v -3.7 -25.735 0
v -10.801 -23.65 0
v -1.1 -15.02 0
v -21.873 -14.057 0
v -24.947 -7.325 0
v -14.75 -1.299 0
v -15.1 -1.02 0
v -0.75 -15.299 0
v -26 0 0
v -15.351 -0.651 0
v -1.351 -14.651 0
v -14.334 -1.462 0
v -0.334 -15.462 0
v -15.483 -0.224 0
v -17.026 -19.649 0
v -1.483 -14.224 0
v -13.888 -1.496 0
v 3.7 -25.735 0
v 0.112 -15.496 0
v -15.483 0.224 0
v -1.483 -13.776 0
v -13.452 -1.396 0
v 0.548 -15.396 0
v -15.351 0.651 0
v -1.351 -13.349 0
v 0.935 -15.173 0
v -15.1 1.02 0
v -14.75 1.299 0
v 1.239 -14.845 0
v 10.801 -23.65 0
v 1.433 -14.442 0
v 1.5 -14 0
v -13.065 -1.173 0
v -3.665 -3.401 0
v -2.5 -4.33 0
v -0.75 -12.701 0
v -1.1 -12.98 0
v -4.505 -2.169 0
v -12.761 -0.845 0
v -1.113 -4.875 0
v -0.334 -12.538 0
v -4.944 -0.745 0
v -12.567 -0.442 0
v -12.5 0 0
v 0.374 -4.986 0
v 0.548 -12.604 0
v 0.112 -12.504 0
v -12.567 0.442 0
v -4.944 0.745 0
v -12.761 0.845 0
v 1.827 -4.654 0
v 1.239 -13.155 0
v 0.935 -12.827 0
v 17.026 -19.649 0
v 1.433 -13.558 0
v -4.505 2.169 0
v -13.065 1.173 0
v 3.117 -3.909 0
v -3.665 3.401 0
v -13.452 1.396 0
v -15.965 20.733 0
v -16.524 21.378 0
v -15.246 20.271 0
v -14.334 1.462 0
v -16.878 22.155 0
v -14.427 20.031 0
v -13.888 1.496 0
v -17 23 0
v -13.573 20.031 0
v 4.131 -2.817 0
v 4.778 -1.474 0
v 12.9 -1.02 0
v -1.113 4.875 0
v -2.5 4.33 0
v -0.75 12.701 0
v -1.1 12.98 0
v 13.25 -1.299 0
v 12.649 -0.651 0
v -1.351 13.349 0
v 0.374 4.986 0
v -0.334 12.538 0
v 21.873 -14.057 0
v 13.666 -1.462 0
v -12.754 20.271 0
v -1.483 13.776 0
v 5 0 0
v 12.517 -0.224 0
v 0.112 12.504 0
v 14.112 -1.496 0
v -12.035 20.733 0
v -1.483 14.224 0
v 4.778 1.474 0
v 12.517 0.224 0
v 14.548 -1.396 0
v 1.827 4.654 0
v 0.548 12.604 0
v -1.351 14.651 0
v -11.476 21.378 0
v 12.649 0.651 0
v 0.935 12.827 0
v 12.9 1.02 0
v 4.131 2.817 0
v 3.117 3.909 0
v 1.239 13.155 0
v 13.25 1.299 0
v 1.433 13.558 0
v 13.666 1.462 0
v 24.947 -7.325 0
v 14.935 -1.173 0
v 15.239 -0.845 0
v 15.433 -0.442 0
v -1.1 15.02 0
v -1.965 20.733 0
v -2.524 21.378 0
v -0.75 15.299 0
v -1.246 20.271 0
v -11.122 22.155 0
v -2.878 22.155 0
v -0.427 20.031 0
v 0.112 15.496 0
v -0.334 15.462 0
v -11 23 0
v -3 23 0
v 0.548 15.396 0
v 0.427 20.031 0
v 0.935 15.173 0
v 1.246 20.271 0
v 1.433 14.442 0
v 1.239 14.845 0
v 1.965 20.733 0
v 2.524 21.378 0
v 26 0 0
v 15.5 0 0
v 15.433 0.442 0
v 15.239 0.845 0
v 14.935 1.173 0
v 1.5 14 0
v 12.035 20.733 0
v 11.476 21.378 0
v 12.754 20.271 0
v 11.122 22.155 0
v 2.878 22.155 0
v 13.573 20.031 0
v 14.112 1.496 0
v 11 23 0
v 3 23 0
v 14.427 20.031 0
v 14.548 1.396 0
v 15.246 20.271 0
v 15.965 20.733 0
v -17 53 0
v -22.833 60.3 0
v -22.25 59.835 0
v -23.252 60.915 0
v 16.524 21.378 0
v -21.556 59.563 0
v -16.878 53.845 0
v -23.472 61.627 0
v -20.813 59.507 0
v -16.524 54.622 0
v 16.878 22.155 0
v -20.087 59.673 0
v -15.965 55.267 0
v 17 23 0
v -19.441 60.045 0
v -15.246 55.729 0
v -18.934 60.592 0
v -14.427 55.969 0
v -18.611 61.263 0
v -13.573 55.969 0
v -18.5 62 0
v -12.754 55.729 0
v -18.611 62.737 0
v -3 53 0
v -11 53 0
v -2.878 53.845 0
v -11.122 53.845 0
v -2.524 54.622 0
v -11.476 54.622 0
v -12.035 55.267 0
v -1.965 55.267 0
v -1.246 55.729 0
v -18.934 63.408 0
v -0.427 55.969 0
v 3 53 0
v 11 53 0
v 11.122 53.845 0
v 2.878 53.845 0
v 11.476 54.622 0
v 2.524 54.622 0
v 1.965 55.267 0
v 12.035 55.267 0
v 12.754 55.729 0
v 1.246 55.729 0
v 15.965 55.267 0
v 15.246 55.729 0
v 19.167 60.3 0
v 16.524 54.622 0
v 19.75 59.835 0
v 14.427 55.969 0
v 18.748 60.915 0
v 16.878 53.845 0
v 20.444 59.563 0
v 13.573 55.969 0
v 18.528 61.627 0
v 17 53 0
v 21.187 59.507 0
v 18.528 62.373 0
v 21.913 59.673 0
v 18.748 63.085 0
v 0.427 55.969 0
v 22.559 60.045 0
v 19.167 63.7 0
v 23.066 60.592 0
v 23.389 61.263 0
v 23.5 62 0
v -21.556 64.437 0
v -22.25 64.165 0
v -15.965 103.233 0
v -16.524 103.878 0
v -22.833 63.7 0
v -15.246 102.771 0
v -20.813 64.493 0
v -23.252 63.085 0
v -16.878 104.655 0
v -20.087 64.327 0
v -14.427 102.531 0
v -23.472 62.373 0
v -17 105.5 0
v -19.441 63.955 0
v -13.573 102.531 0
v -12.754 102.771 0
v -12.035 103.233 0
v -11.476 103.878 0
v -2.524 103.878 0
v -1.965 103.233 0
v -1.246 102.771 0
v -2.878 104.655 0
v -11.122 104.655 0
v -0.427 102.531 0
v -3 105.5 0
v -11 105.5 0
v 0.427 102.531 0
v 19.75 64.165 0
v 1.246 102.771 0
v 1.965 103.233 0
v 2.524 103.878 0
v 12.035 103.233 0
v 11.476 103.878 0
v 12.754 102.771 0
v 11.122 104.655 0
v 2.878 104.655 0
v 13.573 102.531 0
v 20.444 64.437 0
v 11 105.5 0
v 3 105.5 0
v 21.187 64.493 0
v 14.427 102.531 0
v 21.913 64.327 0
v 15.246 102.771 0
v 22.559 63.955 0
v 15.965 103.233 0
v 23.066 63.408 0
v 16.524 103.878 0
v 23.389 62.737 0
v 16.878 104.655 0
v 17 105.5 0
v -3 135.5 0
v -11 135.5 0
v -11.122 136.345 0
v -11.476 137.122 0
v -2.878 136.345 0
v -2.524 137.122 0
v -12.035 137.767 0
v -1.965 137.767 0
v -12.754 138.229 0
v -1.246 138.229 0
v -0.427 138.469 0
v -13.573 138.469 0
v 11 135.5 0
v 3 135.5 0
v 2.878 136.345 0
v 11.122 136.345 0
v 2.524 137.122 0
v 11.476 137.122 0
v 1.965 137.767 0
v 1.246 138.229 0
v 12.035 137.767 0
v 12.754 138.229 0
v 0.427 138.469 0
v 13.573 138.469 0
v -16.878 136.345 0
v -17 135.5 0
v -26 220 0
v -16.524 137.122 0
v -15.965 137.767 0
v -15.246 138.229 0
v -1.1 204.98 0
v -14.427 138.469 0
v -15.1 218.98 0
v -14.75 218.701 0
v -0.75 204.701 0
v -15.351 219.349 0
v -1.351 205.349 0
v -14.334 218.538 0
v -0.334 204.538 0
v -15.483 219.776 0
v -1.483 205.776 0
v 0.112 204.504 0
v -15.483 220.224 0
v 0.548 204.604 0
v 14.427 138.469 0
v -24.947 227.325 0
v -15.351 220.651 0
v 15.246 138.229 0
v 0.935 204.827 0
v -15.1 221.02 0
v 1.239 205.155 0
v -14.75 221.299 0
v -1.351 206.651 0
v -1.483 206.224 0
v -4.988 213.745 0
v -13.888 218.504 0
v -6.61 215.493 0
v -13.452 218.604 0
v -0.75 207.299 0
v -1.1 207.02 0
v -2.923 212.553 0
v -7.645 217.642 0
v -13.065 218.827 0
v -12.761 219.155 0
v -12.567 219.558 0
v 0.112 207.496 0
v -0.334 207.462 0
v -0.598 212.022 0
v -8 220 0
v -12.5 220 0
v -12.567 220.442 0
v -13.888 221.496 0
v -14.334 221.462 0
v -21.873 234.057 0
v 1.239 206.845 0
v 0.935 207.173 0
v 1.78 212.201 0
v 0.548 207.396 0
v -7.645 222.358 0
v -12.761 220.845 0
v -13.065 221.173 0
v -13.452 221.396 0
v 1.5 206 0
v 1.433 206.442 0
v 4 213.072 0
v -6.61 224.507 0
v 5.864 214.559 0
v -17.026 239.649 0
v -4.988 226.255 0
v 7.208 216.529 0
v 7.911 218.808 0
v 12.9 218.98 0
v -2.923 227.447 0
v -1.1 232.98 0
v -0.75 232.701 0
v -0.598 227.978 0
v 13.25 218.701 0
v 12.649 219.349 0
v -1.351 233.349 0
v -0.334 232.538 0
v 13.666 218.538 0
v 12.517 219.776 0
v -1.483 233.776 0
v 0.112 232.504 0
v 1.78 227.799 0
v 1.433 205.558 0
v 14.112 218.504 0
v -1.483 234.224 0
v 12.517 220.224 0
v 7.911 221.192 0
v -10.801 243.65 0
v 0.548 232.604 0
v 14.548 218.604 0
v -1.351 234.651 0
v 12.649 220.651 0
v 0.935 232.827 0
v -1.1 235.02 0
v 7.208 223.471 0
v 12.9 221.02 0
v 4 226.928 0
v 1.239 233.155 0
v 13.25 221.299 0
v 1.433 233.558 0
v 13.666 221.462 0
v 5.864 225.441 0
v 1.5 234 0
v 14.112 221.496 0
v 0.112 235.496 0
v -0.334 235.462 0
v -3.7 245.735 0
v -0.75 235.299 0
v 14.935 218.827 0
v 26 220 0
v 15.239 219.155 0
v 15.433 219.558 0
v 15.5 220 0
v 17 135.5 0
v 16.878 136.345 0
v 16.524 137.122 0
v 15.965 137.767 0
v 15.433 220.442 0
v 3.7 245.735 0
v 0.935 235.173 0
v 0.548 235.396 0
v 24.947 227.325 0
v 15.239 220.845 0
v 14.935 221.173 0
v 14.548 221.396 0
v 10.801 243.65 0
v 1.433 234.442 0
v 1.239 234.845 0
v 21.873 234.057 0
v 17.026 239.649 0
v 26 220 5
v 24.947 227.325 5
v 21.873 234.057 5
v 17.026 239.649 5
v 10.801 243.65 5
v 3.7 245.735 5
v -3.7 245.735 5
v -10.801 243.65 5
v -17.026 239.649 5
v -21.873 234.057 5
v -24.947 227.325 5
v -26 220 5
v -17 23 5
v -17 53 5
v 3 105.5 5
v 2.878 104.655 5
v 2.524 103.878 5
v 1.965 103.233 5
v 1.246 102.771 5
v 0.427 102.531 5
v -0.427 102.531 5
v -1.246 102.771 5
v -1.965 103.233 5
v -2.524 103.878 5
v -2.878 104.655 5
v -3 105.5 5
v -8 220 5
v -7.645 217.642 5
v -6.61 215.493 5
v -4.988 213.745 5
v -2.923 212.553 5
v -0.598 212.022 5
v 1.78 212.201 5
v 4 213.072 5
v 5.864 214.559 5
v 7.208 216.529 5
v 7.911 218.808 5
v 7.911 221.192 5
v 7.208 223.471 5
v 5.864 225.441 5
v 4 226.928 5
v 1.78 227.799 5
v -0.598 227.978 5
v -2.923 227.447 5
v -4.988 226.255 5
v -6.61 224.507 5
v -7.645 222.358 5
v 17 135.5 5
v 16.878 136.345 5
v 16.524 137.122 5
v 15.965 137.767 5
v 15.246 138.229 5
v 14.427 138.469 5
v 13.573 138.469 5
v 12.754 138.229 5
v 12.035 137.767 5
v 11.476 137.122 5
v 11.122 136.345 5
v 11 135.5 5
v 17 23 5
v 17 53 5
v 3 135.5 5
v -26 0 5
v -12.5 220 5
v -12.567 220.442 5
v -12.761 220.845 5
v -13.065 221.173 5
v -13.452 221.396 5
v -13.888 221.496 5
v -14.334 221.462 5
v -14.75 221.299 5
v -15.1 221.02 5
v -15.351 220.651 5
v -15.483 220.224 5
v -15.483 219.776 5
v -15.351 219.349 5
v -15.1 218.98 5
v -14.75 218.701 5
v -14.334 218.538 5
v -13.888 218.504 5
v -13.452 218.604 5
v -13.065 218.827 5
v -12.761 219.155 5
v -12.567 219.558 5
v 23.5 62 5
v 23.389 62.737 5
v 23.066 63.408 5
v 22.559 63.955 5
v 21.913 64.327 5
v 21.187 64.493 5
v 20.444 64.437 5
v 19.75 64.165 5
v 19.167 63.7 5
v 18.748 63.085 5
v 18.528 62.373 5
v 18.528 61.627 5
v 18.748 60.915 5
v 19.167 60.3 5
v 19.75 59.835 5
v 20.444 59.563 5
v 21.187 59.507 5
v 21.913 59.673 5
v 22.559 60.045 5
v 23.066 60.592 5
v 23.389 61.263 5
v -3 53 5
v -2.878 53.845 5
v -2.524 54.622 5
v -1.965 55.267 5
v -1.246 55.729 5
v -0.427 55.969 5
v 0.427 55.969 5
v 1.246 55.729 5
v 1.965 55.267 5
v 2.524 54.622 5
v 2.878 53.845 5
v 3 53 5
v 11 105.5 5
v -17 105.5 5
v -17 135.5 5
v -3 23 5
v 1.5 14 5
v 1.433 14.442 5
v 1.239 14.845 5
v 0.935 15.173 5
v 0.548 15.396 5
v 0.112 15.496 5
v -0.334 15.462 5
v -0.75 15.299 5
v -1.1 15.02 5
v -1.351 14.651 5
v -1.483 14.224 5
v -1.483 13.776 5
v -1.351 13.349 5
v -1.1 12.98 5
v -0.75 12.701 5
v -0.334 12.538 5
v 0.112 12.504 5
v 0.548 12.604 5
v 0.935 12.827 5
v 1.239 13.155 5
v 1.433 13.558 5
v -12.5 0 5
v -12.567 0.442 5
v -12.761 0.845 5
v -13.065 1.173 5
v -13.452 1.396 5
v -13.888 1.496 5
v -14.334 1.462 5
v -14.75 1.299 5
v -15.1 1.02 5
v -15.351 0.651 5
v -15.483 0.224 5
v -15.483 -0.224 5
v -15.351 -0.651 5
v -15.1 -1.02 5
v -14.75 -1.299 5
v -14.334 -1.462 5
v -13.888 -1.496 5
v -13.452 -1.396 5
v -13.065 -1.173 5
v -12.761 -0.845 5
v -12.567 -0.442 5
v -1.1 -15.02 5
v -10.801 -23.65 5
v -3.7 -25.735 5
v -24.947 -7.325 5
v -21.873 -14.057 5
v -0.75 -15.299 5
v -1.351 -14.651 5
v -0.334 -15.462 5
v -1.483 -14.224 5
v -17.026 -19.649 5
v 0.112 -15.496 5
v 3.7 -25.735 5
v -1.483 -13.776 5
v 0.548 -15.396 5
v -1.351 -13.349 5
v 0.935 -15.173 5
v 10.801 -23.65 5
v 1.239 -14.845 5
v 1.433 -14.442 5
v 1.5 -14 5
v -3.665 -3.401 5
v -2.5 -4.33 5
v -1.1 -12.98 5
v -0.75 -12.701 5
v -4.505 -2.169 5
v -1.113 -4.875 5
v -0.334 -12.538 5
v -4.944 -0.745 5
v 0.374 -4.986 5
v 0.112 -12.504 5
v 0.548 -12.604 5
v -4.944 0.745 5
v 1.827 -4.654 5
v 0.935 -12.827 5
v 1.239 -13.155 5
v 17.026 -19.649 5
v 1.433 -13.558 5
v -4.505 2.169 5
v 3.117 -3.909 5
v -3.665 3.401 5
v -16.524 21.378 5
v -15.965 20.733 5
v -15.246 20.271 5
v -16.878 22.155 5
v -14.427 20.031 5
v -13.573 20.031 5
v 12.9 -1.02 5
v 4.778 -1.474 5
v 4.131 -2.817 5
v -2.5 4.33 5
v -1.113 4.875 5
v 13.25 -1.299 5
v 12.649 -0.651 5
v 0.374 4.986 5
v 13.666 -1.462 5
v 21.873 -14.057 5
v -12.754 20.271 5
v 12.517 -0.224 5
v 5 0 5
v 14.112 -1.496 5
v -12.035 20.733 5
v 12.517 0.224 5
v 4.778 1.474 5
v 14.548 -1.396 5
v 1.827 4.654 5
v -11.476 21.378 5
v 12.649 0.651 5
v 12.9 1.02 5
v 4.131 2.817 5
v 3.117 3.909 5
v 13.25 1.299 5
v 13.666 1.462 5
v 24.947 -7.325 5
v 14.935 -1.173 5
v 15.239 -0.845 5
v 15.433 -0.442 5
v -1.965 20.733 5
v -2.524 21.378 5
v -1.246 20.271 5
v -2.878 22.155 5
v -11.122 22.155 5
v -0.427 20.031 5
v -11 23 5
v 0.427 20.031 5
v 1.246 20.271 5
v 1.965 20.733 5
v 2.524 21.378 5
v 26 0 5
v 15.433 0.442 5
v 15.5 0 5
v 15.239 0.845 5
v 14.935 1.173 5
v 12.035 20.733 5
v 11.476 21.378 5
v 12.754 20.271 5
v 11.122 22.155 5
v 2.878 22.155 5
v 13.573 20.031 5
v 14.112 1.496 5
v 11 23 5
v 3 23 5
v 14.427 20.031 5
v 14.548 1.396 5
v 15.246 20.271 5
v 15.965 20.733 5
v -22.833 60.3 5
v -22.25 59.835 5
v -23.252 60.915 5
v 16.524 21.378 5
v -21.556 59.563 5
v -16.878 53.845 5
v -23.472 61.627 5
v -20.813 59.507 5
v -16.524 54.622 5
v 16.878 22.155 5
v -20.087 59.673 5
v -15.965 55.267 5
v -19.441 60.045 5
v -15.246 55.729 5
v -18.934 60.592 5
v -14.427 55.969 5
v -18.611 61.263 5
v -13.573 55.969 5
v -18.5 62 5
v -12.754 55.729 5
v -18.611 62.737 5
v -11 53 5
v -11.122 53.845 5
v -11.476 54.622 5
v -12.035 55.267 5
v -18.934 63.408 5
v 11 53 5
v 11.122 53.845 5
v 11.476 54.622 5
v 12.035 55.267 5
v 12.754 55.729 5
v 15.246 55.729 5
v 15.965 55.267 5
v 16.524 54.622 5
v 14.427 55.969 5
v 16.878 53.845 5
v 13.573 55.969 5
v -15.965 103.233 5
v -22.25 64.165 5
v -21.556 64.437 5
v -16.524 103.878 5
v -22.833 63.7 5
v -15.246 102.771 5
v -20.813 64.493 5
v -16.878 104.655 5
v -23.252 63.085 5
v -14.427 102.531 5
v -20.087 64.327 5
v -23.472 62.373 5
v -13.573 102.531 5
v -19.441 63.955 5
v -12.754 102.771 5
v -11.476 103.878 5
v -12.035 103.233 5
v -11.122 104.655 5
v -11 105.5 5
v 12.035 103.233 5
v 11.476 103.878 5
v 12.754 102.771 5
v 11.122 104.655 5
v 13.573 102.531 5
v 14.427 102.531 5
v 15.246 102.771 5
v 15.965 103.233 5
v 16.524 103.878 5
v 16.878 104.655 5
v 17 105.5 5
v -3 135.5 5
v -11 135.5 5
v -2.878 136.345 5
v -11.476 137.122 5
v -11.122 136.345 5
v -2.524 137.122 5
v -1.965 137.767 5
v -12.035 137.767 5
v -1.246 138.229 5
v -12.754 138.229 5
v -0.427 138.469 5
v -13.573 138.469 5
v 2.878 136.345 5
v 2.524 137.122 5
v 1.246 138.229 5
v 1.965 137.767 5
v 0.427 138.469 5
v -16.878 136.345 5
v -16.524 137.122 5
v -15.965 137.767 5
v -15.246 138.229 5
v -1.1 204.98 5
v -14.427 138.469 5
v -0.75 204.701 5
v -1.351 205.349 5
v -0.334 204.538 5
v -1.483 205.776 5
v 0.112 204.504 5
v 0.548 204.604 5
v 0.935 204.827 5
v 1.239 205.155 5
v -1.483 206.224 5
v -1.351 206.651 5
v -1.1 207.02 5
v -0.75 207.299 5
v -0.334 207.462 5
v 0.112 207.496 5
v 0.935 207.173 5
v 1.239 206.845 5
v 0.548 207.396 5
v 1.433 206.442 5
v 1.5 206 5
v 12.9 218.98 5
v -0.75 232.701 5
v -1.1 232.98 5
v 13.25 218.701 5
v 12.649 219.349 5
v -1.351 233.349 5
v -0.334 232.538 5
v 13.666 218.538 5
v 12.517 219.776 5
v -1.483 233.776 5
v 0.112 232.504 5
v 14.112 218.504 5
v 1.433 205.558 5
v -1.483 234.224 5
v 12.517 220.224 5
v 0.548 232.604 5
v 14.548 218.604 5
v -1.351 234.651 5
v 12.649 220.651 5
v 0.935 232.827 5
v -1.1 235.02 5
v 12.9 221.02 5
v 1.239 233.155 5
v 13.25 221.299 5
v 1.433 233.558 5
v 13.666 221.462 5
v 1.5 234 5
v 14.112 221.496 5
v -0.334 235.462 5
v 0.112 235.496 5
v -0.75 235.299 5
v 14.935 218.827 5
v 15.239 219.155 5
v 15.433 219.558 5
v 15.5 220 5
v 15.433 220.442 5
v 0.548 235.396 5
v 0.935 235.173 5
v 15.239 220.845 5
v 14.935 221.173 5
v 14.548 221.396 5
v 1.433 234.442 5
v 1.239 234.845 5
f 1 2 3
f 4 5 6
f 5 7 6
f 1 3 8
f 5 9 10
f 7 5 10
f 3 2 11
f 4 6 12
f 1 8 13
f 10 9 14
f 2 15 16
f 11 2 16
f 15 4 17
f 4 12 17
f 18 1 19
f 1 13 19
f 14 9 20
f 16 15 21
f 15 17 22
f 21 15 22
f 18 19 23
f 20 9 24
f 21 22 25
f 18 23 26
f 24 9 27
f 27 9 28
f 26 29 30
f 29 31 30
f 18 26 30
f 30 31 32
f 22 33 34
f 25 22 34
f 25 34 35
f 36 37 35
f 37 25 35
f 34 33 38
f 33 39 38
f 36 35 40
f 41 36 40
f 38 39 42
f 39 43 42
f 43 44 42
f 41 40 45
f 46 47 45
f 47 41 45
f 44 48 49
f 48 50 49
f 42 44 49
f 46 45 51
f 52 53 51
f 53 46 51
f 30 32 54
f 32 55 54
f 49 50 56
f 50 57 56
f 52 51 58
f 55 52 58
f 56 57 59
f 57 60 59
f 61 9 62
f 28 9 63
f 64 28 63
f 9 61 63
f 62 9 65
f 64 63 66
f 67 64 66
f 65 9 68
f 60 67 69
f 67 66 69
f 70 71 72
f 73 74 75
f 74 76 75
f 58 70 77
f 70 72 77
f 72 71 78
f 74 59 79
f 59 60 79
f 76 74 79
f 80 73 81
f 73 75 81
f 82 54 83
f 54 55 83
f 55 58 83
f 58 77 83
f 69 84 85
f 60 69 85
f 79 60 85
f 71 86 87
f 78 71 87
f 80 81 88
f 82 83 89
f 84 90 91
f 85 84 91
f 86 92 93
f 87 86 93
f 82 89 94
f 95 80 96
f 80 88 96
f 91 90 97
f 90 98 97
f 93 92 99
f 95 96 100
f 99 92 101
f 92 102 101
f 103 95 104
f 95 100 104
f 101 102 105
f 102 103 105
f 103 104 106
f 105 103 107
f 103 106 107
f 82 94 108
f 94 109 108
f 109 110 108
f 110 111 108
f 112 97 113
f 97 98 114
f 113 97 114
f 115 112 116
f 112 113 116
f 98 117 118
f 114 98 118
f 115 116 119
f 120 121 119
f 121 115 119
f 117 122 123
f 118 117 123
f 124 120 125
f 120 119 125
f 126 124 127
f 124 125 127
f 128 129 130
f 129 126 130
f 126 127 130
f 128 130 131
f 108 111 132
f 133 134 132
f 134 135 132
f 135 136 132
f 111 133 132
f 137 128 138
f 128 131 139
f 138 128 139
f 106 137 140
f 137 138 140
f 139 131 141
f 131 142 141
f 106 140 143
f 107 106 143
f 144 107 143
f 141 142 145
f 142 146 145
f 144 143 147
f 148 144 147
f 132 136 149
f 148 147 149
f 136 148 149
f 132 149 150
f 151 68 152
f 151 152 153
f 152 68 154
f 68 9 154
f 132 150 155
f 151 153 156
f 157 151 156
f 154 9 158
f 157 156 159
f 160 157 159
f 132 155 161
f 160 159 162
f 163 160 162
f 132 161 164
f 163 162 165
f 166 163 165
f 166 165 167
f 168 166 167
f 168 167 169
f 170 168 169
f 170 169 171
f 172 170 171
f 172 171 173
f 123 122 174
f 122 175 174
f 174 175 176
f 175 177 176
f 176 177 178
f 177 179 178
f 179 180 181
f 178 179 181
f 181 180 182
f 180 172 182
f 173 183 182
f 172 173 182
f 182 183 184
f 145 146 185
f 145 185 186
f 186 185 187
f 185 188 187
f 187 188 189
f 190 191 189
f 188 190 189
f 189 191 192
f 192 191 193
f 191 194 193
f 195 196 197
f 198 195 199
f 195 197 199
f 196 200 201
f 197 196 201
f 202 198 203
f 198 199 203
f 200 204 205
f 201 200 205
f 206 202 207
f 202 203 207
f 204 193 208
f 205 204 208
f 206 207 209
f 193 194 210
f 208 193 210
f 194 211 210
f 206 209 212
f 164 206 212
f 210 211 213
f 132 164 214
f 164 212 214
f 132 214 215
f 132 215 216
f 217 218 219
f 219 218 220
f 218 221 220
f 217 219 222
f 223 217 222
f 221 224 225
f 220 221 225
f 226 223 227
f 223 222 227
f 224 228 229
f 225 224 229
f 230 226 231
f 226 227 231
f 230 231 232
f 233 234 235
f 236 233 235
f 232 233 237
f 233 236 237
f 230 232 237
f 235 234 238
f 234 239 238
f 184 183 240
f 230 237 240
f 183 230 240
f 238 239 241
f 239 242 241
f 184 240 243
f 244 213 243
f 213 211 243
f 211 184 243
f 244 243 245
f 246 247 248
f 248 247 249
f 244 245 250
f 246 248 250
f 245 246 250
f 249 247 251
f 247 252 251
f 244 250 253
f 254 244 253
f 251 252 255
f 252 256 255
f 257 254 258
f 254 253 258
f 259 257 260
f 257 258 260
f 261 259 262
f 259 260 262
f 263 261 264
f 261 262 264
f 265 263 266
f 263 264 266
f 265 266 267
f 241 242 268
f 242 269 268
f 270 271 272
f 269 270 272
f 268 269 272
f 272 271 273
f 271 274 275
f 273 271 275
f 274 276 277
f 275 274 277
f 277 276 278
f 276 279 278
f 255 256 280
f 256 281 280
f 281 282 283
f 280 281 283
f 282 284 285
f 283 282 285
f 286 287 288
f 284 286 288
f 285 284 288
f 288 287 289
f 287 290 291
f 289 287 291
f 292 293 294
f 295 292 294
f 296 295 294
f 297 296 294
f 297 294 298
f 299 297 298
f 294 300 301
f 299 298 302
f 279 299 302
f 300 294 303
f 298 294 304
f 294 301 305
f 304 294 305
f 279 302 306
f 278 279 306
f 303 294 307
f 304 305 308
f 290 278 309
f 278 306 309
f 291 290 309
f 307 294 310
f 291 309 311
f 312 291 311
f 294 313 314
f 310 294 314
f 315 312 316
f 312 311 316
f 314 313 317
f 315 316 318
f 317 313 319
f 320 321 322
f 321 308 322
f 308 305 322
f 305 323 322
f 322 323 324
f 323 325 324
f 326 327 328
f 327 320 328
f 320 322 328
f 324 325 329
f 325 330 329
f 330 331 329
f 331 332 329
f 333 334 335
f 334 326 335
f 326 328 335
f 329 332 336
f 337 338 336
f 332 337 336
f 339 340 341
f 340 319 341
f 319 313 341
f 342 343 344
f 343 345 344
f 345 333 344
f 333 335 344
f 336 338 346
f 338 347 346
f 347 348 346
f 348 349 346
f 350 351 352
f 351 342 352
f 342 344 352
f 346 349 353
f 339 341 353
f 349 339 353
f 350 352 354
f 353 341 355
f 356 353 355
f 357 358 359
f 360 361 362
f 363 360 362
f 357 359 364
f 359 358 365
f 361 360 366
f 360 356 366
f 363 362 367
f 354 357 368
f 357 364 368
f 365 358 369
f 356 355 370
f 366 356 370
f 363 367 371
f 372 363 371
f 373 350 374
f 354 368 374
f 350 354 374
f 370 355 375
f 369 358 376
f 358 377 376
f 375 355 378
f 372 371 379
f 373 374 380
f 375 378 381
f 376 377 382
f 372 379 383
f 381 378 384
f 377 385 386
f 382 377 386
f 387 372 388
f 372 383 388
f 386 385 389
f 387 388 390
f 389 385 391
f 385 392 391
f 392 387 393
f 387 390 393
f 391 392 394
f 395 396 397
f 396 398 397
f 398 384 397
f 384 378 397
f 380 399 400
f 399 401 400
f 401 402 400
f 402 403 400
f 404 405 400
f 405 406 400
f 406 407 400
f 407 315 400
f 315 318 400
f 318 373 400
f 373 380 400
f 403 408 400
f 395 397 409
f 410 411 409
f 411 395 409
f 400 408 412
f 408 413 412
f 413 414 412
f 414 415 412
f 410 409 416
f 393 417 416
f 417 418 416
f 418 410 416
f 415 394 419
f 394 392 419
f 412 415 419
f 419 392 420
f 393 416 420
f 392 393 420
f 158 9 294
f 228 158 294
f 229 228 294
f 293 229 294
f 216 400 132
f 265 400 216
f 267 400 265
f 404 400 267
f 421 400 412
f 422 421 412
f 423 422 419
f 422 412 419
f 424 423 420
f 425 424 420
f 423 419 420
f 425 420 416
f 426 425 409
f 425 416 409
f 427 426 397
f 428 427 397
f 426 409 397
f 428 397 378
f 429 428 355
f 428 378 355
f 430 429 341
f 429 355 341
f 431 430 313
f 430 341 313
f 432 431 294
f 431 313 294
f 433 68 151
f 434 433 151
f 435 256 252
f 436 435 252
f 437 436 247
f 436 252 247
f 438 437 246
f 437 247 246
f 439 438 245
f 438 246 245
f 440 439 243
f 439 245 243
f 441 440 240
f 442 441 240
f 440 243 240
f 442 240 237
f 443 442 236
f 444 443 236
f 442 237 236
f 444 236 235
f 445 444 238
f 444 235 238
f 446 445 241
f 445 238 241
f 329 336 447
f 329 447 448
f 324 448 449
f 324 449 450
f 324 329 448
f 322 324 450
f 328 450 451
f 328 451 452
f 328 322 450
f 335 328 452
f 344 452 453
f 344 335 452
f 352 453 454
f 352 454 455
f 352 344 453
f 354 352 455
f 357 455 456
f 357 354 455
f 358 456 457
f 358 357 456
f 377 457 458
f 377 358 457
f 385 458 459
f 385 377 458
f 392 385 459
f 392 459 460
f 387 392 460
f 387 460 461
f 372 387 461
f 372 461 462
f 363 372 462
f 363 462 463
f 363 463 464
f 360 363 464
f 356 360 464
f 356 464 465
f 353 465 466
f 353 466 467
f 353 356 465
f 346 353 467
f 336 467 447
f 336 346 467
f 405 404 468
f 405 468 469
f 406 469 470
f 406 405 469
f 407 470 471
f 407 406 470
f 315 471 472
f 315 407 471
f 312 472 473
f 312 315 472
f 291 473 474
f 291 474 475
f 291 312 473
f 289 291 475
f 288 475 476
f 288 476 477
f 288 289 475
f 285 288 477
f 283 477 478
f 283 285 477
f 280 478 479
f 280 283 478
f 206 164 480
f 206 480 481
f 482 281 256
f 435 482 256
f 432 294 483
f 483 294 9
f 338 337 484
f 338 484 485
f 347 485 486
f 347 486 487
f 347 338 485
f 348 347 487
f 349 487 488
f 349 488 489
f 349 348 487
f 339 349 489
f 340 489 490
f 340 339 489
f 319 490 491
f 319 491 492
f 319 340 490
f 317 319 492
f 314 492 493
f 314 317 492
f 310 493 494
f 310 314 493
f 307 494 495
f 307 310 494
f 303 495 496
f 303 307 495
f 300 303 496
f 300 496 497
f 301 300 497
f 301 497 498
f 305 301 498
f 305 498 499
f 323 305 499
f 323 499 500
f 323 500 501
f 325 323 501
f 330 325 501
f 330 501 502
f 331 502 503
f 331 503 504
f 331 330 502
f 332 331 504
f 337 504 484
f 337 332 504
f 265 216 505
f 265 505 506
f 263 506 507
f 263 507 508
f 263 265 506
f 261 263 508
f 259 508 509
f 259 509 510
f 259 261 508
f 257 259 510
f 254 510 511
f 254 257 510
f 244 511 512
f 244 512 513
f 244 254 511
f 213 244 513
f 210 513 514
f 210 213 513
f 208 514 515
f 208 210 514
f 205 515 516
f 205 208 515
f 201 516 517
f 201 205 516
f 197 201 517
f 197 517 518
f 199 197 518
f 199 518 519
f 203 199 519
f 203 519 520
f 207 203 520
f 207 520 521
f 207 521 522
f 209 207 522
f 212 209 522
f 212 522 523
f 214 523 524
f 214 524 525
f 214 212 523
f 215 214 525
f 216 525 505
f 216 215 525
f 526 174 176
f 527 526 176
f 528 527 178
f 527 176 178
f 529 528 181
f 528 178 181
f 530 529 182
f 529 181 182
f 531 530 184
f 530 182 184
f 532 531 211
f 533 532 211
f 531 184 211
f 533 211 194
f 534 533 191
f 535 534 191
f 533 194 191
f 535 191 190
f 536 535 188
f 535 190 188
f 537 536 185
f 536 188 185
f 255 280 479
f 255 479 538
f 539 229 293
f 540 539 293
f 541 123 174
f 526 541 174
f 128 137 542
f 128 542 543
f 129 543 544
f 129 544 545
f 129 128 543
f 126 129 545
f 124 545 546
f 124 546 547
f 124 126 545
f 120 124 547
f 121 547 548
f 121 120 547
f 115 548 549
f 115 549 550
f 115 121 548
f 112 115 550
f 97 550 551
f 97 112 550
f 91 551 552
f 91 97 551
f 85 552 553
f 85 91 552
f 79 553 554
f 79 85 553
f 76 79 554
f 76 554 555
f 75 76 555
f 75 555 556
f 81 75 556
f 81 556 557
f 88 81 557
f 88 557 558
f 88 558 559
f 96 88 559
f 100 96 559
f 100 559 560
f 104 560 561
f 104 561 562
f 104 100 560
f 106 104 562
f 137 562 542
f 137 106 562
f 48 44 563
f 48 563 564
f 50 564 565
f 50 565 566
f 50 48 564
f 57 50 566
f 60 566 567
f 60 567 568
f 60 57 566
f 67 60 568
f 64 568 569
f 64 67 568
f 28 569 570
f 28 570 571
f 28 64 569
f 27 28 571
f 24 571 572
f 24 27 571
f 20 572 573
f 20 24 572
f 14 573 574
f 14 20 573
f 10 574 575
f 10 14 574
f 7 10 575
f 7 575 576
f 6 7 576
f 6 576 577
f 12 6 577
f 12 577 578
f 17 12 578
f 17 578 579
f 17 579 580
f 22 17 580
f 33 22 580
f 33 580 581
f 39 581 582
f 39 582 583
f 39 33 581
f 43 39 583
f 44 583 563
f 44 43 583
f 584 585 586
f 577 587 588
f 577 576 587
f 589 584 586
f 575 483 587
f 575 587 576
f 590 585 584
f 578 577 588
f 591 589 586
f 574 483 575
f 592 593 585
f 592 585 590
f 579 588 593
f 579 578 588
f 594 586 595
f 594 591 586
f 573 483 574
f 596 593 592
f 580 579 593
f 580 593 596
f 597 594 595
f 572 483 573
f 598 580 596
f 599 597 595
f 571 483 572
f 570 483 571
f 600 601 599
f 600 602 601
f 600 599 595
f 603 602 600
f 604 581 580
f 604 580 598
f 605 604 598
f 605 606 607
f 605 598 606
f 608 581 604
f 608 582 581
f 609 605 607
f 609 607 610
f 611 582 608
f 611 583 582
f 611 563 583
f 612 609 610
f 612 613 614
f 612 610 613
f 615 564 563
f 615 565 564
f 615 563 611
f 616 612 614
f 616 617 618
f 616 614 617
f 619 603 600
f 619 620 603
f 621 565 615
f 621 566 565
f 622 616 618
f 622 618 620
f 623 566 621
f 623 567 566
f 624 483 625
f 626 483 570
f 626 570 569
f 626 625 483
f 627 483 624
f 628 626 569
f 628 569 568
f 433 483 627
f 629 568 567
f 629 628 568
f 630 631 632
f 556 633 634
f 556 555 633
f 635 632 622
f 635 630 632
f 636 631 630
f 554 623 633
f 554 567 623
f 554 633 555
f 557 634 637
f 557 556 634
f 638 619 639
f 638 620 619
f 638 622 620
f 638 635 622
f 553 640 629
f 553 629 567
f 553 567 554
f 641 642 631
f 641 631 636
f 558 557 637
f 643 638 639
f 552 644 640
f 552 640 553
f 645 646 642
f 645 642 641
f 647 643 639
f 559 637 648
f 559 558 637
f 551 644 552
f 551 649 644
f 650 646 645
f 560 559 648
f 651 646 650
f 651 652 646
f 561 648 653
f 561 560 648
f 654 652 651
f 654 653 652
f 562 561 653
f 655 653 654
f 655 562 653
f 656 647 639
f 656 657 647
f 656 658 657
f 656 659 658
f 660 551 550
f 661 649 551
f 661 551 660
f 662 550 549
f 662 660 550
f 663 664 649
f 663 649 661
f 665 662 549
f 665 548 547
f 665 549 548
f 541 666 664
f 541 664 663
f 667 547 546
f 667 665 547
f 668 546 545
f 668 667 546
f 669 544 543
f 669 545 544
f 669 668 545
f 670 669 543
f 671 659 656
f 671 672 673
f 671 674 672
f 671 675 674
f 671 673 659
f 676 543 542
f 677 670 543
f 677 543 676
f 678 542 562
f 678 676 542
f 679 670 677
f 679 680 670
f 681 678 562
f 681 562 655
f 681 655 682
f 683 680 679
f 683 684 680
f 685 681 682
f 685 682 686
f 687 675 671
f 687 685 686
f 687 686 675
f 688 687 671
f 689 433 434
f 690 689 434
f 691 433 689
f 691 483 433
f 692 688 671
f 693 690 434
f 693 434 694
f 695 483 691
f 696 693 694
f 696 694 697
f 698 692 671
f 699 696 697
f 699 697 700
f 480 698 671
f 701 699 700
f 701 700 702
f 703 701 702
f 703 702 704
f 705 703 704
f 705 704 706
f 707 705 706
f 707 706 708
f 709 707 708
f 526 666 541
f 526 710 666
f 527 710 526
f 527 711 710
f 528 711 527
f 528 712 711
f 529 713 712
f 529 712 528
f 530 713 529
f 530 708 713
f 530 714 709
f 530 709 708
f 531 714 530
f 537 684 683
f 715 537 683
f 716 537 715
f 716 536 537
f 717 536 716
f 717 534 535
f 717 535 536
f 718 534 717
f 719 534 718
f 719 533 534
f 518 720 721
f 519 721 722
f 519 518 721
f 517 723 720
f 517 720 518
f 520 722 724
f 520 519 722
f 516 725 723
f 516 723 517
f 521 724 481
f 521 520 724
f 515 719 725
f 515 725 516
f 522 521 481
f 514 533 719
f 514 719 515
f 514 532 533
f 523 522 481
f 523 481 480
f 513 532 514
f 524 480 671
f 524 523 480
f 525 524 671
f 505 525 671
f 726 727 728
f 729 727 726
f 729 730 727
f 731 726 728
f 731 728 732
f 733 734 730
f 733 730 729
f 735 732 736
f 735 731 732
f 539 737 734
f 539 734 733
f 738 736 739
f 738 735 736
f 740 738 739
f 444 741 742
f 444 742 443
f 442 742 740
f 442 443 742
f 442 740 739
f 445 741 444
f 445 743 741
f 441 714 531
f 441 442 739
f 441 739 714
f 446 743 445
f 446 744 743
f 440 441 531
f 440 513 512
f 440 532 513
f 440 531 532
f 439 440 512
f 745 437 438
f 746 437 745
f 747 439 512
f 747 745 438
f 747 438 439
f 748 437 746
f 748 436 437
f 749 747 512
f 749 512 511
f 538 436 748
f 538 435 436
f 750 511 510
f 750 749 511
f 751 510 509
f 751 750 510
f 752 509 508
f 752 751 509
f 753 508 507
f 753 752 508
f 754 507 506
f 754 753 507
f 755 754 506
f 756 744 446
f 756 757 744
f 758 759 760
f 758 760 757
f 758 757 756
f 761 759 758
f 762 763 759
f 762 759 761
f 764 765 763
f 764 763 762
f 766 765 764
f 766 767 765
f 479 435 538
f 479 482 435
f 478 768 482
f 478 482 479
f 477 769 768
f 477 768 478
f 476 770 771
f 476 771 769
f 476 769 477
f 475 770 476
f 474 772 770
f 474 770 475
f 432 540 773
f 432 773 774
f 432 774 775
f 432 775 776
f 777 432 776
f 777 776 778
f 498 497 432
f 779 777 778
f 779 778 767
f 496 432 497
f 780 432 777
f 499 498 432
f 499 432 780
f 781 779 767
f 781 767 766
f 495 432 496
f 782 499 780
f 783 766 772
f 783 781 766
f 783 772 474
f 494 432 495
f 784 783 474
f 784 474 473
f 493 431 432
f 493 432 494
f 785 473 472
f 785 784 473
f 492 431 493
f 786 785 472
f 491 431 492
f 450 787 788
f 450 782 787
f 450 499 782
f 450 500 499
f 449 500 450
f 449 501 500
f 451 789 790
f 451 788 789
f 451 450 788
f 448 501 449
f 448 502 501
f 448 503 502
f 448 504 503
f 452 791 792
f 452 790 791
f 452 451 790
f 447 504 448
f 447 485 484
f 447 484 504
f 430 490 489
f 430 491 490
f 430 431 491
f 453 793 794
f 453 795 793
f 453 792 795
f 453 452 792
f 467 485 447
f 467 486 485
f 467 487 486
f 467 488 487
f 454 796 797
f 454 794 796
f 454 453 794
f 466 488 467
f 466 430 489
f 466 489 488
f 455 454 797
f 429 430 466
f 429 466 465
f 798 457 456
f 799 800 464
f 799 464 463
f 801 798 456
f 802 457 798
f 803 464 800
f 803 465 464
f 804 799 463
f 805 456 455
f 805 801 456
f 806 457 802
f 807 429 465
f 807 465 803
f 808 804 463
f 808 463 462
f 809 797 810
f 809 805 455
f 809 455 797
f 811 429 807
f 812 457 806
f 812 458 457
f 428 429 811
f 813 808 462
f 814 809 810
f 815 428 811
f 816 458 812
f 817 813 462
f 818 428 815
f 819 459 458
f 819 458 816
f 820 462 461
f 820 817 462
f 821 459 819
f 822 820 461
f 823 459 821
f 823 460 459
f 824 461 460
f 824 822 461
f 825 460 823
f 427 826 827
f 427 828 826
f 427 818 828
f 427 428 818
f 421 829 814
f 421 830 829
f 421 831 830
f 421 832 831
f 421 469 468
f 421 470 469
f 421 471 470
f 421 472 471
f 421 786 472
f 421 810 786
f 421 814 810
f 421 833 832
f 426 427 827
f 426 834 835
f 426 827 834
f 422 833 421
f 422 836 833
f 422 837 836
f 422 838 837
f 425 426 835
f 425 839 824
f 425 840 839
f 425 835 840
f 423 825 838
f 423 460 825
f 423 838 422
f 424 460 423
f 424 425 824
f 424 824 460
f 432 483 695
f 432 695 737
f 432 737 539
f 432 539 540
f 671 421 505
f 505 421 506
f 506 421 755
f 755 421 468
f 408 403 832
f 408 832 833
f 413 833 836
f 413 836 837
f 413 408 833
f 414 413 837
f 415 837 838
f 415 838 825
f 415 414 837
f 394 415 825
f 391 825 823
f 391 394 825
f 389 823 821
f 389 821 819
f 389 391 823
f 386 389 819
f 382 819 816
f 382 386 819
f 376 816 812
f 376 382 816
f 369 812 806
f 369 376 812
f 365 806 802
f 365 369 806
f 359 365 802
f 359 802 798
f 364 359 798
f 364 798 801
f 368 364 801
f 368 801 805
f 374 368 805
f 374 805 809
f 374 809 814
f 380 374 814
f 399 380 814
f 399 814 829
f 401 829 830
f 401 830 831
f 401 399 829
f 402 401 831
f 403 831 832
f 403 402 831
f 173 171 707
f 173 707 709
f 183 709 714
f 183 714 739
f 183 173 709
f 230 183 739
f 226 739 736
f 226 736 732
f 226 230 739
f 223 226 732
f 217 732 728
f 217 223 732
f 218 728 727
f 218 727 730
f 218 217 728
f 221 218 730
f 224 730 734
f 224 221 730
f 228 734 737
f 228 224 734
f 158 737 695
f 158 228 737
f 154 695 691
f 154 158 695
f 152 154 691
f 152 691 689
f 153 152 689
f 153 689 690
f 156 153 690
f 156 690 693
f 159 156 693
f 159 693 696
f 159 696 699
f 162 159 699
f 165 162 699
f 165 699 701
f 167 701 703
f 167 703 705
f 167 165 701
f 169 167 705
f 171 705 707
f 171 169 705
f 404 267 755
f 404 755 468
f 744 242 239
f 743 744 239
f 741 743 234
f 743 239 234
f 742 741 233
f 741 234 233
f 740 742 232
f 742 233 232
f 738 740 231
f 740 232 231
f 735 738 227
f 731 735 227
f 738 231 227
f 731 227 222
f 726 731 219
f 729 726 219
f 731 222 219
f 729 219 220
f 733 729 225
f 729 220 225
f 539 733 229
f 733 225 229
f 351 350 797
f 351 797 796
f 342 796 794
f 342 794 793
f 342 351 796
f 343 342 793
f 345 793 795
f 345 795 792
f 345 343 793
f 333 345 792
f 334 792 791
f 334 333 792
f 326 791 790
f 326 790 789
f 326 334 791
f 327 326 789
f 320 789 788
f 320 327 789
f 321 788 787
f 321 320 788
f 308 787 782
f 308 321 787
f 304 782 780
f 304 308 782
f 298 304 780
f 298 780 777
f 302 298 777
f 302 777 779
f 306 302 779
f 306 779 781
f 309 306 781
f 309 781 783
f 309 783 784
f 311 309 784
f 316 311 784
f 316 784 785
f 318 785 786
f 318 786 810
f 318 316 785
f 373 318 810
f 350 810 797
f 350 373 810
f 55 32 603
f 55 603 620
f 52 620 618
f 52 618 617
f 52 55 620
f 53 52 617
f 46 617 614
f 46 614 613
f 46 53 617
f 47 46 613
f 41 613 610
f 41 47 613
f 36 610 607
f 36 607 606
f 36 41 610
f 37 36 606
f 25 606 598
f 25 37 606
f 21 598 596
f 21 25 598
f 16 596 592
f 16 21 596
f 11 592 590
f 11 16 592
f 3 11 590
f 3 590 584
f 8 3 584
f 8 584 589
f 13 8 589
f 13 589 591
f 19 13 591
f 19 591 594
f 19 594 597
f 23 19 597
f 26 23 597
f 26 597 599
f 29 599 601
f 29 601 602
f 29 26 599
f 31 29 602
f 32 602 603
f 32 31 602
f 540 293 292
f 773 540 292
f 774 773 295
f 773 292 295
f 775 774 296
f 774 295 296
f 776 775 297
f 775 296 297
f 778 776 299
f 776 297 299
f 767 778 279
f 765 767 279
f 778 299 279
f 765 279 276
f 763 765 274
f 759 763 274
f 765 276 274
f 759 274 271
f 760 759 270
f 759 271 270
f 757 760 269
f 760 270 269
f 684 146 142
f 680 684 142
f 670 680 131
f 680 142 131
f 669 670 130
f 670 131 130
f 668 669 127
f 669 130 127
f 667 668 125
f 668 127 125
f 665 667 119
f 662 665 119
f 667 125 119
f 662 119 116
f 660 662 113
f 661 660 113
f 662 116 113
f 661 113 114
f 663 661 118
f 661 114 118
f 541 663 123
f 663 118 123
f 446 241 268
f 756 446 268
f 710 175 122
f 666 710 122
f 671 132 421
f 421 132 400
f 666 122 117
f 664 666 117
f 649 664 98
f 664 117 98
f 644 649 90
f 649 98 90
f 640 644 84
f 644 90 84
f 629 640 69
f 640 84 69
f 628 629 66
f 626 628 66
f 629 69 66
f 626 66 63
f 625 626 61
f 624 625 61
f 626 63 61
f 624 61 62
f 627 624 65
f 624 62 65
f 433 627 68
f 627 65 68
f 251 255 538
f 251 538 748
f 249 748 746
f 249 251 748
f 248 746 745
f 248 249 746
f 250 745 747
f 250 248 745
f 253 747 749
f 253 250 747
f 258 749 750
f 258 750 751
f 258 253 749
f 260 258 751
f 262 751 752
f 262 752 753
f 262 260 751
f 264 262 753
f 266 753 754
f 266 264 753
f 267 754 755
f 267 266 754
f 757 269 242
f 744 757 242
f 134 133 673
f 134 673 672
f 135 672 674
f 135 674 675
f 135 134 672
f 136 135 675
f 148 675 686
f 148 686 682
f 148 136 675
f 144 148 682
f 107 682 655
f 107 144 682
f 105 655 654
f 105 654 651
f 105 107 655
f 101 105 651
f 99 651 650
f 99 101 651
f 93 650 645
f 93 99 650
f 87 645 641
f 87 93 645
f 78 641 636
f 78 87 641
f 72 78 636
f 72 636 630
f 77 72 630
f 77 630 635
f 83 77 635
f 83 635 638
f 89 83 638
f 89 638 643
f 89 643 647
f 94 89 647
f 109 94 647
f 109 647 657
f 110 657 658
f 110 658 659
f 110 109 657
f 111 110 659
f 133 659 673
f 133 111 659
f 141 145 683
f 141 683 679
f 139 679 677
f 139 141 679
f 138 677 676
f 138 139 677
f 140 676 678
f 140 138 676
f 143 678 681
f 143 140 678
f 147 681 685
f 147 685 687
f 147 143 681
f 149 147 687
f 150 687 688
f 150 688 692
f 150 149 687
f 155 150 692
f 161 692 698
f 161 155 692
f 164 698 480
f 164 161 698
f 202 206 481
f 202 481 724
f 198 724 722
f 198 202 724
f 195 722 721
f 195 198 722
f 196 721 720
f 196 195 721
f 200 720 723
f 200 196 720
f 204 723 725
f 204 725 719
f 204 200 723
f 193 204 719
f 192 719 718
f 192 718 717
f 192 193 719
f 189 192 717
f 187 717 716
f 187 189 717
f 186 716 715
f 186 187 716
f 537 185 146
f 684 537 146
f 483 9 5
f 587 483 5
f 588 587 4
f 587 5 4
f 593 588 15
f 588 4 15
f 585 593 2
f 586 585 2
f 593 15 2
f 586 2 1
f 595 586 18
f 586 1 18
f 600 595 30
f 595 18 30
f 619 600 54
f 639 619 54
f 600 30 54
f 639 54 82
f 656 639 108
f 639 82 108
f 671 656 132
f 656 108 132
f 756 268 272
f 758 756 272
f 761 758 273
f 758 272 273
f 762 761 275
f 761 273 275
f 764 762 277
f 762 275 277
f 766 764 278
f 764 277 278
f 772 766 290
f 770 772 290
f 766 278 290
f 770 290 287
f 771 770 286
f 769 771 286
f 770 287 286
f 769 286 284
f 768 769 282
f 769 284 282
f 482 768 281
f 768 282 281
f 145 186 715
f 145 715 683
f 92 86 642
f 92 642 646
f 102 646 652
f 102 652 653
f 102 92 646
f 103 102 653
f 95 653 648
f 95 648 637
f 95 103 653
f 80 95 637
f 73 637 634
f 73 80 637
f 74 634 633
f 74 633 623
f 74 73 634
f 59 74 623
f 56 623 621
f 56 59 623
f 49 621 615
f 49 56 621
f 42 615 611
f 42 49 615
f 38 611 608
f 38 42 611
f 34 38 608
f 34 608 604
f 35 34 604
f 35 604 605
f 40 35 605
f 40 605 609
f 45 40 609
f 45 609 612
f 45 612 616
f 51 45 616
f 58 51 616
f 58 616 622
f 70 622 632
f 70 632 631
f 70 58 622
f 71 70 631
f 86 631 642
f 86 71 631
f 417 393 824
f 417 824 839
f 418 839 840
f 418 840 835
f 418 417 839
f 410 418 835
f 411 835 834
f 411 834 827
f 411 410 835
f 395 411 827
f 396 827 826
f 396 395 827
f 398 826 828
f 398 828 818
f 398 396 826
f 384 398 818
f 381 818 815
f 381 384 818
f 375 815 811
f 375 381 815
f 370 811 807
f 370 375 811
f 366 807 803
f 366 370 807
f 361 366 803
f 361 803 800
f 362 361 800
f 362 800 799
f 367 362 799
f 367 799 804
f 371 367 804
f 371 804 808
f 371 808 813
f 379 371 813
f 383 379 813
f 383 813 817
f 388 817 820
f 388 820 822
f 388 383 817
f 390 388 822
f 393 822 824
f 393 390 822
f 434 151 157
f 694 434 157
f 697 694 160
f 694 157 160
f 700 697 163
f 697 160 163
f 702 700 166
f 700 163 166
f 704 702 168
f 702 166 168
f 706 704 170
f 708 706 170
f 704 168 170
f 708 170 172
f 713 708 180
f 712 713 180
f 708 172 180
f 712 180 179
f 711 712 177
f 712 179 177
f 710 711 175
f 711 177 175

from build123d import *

# Parameters (mm, degrees)
SKETCH_1_R      = 5
SKETCH_1_R_2    = 1.5
SKETCH_1_R_3    = 8
SKETCH_1_R_4    = 2.5
EXTRUDE_1_DEPTH = 5


with BuildPart() as part:
    # 草图1 → 凸台-拉伸1 (new body)
    with BuildSketch(Plane.XY):
        with BuildLine():
            Line((-26, 220), (-26, 0))
            ThreePointArc((-26, 0), (0, -26), (26, 0))
            Line((26, 0), (26, 220))
            ThreePointArc((26, 220), (0, 246), (-26, 220))
        make_face()
        Circle(SKETCH_1_R, mode=Mode.SUBTRACT)
        with Locations((0, -14)):
            Circle(SKETCH_1_R_2, mode=Mode.SUBTRACT)
        with Locations(Location((0, 220, 0), (0, 0, 180))):
            Circle(SKETCH_1_R_3, mode=Mode.SUBTRACT)
        with Locations((-14, 0)):
            Circle(SKETCH_1_R_2, mode=Mode.SUBTRACT)
        with Locations((0, 14)):
            Circle(SKETCH_1_R_2, mode=Mode.SUBTRACT)
        with Locations((14, 0)):
            Circle(SKETCH_1_R_2, mode=Mode.SUBTRACT)
        with Locations((-21, 62)):
            Circle(SKETCH_1_R_4, mode=Mode.SUBTRACT)
        with Locations((21, 62)):
            Circle(SKETCH_1_R_4, mode=Mode.SUBTRACT)
        with Locations((0, 234)):
            Circle(SKETCH_1_R_2, mode=Mode.SUBTRACT)
        with Locations((14, 220)):
            Circle(SKETCH_1_R_2, mode=Mode.SUBTRACT)
        with Locations((0, 206)):
            Circle(SKETCH_1_R_2, mode=Mode.SUBTRACT)
        with Locations((-14, 220)):
            Circle(SKETCH_1_R_2, mode=Mode.SUBTRACT)
        with BuildLine():
            Line((-3, 23), (-3, 53))
            ThreePointArc((-3, 53), (0, 56), (3, 53))
            Line((3, 53), (3, 23))
            ThreePointArc((3, 23), (0, 20), (-3, 23))
        make_face(mode=Mode.SUBTRACT)
        with BuildLine():
            Line((-17, 23), (-17, 53))
            ThreePointArc((-17, 53), (-14, 56), (-11, 53))
            Line((-11, 53), (-11, 23))
            ThreePointArc((-11, 23), (-14, 20), (-17, 23))
        make_face(mode=Mode.SUBTRACT)
        with BuildLine():
            Line((17, 23), (17, 53))
            ThreePointArc((17, 53), (14, 56), (11, 53))
            Line((11, 53), (11, 23))
            ThreePointArc((11, 23), (14, 20), (17, 23))
        make_face(mode=Mode.SUBTRACT)
        with BuildLine():
            Line((-3, 105.5), (-3, 135.5))
            ThreePointArc((-3, 135.5), (0, 138.5), (3, 135.5))
            Line((3, 135.5), (3, 105.5))
            ThreePointArc((3, 105.5), (0, 102.5), (-3, 105.5))
        make_face(mode=Mode.SUBTRACT)
        with BuildLine():
            Line((-17, 105.5), (-17, 135.5))
            ThreePointArc((-17, 135.5), (-14, 138.5), (-11, 135.5))
            Line((-11, 135.5), (-11, 105.5))
            ThreePointArc((-11, 105.5), (-14, 102.5), (-17, 105.5))
        make_face(mode=Mode.SUBTRACT)
        with BuildLine():
            Line((17, 105.5), (17, 135.5))
            ThreePointArc((17, 135.5), (14, 138.5), (11, 135.5))
            Line((11, 135.5), (11, 105.5))
            ThreePointArc((11, 105.5), (14, 102.5), (17, 105.5))
        make_face(mode=Mode.SUBTRACT)
    extrude(amount=EXTRUDE_1_DEPTH)


solid = part.part
